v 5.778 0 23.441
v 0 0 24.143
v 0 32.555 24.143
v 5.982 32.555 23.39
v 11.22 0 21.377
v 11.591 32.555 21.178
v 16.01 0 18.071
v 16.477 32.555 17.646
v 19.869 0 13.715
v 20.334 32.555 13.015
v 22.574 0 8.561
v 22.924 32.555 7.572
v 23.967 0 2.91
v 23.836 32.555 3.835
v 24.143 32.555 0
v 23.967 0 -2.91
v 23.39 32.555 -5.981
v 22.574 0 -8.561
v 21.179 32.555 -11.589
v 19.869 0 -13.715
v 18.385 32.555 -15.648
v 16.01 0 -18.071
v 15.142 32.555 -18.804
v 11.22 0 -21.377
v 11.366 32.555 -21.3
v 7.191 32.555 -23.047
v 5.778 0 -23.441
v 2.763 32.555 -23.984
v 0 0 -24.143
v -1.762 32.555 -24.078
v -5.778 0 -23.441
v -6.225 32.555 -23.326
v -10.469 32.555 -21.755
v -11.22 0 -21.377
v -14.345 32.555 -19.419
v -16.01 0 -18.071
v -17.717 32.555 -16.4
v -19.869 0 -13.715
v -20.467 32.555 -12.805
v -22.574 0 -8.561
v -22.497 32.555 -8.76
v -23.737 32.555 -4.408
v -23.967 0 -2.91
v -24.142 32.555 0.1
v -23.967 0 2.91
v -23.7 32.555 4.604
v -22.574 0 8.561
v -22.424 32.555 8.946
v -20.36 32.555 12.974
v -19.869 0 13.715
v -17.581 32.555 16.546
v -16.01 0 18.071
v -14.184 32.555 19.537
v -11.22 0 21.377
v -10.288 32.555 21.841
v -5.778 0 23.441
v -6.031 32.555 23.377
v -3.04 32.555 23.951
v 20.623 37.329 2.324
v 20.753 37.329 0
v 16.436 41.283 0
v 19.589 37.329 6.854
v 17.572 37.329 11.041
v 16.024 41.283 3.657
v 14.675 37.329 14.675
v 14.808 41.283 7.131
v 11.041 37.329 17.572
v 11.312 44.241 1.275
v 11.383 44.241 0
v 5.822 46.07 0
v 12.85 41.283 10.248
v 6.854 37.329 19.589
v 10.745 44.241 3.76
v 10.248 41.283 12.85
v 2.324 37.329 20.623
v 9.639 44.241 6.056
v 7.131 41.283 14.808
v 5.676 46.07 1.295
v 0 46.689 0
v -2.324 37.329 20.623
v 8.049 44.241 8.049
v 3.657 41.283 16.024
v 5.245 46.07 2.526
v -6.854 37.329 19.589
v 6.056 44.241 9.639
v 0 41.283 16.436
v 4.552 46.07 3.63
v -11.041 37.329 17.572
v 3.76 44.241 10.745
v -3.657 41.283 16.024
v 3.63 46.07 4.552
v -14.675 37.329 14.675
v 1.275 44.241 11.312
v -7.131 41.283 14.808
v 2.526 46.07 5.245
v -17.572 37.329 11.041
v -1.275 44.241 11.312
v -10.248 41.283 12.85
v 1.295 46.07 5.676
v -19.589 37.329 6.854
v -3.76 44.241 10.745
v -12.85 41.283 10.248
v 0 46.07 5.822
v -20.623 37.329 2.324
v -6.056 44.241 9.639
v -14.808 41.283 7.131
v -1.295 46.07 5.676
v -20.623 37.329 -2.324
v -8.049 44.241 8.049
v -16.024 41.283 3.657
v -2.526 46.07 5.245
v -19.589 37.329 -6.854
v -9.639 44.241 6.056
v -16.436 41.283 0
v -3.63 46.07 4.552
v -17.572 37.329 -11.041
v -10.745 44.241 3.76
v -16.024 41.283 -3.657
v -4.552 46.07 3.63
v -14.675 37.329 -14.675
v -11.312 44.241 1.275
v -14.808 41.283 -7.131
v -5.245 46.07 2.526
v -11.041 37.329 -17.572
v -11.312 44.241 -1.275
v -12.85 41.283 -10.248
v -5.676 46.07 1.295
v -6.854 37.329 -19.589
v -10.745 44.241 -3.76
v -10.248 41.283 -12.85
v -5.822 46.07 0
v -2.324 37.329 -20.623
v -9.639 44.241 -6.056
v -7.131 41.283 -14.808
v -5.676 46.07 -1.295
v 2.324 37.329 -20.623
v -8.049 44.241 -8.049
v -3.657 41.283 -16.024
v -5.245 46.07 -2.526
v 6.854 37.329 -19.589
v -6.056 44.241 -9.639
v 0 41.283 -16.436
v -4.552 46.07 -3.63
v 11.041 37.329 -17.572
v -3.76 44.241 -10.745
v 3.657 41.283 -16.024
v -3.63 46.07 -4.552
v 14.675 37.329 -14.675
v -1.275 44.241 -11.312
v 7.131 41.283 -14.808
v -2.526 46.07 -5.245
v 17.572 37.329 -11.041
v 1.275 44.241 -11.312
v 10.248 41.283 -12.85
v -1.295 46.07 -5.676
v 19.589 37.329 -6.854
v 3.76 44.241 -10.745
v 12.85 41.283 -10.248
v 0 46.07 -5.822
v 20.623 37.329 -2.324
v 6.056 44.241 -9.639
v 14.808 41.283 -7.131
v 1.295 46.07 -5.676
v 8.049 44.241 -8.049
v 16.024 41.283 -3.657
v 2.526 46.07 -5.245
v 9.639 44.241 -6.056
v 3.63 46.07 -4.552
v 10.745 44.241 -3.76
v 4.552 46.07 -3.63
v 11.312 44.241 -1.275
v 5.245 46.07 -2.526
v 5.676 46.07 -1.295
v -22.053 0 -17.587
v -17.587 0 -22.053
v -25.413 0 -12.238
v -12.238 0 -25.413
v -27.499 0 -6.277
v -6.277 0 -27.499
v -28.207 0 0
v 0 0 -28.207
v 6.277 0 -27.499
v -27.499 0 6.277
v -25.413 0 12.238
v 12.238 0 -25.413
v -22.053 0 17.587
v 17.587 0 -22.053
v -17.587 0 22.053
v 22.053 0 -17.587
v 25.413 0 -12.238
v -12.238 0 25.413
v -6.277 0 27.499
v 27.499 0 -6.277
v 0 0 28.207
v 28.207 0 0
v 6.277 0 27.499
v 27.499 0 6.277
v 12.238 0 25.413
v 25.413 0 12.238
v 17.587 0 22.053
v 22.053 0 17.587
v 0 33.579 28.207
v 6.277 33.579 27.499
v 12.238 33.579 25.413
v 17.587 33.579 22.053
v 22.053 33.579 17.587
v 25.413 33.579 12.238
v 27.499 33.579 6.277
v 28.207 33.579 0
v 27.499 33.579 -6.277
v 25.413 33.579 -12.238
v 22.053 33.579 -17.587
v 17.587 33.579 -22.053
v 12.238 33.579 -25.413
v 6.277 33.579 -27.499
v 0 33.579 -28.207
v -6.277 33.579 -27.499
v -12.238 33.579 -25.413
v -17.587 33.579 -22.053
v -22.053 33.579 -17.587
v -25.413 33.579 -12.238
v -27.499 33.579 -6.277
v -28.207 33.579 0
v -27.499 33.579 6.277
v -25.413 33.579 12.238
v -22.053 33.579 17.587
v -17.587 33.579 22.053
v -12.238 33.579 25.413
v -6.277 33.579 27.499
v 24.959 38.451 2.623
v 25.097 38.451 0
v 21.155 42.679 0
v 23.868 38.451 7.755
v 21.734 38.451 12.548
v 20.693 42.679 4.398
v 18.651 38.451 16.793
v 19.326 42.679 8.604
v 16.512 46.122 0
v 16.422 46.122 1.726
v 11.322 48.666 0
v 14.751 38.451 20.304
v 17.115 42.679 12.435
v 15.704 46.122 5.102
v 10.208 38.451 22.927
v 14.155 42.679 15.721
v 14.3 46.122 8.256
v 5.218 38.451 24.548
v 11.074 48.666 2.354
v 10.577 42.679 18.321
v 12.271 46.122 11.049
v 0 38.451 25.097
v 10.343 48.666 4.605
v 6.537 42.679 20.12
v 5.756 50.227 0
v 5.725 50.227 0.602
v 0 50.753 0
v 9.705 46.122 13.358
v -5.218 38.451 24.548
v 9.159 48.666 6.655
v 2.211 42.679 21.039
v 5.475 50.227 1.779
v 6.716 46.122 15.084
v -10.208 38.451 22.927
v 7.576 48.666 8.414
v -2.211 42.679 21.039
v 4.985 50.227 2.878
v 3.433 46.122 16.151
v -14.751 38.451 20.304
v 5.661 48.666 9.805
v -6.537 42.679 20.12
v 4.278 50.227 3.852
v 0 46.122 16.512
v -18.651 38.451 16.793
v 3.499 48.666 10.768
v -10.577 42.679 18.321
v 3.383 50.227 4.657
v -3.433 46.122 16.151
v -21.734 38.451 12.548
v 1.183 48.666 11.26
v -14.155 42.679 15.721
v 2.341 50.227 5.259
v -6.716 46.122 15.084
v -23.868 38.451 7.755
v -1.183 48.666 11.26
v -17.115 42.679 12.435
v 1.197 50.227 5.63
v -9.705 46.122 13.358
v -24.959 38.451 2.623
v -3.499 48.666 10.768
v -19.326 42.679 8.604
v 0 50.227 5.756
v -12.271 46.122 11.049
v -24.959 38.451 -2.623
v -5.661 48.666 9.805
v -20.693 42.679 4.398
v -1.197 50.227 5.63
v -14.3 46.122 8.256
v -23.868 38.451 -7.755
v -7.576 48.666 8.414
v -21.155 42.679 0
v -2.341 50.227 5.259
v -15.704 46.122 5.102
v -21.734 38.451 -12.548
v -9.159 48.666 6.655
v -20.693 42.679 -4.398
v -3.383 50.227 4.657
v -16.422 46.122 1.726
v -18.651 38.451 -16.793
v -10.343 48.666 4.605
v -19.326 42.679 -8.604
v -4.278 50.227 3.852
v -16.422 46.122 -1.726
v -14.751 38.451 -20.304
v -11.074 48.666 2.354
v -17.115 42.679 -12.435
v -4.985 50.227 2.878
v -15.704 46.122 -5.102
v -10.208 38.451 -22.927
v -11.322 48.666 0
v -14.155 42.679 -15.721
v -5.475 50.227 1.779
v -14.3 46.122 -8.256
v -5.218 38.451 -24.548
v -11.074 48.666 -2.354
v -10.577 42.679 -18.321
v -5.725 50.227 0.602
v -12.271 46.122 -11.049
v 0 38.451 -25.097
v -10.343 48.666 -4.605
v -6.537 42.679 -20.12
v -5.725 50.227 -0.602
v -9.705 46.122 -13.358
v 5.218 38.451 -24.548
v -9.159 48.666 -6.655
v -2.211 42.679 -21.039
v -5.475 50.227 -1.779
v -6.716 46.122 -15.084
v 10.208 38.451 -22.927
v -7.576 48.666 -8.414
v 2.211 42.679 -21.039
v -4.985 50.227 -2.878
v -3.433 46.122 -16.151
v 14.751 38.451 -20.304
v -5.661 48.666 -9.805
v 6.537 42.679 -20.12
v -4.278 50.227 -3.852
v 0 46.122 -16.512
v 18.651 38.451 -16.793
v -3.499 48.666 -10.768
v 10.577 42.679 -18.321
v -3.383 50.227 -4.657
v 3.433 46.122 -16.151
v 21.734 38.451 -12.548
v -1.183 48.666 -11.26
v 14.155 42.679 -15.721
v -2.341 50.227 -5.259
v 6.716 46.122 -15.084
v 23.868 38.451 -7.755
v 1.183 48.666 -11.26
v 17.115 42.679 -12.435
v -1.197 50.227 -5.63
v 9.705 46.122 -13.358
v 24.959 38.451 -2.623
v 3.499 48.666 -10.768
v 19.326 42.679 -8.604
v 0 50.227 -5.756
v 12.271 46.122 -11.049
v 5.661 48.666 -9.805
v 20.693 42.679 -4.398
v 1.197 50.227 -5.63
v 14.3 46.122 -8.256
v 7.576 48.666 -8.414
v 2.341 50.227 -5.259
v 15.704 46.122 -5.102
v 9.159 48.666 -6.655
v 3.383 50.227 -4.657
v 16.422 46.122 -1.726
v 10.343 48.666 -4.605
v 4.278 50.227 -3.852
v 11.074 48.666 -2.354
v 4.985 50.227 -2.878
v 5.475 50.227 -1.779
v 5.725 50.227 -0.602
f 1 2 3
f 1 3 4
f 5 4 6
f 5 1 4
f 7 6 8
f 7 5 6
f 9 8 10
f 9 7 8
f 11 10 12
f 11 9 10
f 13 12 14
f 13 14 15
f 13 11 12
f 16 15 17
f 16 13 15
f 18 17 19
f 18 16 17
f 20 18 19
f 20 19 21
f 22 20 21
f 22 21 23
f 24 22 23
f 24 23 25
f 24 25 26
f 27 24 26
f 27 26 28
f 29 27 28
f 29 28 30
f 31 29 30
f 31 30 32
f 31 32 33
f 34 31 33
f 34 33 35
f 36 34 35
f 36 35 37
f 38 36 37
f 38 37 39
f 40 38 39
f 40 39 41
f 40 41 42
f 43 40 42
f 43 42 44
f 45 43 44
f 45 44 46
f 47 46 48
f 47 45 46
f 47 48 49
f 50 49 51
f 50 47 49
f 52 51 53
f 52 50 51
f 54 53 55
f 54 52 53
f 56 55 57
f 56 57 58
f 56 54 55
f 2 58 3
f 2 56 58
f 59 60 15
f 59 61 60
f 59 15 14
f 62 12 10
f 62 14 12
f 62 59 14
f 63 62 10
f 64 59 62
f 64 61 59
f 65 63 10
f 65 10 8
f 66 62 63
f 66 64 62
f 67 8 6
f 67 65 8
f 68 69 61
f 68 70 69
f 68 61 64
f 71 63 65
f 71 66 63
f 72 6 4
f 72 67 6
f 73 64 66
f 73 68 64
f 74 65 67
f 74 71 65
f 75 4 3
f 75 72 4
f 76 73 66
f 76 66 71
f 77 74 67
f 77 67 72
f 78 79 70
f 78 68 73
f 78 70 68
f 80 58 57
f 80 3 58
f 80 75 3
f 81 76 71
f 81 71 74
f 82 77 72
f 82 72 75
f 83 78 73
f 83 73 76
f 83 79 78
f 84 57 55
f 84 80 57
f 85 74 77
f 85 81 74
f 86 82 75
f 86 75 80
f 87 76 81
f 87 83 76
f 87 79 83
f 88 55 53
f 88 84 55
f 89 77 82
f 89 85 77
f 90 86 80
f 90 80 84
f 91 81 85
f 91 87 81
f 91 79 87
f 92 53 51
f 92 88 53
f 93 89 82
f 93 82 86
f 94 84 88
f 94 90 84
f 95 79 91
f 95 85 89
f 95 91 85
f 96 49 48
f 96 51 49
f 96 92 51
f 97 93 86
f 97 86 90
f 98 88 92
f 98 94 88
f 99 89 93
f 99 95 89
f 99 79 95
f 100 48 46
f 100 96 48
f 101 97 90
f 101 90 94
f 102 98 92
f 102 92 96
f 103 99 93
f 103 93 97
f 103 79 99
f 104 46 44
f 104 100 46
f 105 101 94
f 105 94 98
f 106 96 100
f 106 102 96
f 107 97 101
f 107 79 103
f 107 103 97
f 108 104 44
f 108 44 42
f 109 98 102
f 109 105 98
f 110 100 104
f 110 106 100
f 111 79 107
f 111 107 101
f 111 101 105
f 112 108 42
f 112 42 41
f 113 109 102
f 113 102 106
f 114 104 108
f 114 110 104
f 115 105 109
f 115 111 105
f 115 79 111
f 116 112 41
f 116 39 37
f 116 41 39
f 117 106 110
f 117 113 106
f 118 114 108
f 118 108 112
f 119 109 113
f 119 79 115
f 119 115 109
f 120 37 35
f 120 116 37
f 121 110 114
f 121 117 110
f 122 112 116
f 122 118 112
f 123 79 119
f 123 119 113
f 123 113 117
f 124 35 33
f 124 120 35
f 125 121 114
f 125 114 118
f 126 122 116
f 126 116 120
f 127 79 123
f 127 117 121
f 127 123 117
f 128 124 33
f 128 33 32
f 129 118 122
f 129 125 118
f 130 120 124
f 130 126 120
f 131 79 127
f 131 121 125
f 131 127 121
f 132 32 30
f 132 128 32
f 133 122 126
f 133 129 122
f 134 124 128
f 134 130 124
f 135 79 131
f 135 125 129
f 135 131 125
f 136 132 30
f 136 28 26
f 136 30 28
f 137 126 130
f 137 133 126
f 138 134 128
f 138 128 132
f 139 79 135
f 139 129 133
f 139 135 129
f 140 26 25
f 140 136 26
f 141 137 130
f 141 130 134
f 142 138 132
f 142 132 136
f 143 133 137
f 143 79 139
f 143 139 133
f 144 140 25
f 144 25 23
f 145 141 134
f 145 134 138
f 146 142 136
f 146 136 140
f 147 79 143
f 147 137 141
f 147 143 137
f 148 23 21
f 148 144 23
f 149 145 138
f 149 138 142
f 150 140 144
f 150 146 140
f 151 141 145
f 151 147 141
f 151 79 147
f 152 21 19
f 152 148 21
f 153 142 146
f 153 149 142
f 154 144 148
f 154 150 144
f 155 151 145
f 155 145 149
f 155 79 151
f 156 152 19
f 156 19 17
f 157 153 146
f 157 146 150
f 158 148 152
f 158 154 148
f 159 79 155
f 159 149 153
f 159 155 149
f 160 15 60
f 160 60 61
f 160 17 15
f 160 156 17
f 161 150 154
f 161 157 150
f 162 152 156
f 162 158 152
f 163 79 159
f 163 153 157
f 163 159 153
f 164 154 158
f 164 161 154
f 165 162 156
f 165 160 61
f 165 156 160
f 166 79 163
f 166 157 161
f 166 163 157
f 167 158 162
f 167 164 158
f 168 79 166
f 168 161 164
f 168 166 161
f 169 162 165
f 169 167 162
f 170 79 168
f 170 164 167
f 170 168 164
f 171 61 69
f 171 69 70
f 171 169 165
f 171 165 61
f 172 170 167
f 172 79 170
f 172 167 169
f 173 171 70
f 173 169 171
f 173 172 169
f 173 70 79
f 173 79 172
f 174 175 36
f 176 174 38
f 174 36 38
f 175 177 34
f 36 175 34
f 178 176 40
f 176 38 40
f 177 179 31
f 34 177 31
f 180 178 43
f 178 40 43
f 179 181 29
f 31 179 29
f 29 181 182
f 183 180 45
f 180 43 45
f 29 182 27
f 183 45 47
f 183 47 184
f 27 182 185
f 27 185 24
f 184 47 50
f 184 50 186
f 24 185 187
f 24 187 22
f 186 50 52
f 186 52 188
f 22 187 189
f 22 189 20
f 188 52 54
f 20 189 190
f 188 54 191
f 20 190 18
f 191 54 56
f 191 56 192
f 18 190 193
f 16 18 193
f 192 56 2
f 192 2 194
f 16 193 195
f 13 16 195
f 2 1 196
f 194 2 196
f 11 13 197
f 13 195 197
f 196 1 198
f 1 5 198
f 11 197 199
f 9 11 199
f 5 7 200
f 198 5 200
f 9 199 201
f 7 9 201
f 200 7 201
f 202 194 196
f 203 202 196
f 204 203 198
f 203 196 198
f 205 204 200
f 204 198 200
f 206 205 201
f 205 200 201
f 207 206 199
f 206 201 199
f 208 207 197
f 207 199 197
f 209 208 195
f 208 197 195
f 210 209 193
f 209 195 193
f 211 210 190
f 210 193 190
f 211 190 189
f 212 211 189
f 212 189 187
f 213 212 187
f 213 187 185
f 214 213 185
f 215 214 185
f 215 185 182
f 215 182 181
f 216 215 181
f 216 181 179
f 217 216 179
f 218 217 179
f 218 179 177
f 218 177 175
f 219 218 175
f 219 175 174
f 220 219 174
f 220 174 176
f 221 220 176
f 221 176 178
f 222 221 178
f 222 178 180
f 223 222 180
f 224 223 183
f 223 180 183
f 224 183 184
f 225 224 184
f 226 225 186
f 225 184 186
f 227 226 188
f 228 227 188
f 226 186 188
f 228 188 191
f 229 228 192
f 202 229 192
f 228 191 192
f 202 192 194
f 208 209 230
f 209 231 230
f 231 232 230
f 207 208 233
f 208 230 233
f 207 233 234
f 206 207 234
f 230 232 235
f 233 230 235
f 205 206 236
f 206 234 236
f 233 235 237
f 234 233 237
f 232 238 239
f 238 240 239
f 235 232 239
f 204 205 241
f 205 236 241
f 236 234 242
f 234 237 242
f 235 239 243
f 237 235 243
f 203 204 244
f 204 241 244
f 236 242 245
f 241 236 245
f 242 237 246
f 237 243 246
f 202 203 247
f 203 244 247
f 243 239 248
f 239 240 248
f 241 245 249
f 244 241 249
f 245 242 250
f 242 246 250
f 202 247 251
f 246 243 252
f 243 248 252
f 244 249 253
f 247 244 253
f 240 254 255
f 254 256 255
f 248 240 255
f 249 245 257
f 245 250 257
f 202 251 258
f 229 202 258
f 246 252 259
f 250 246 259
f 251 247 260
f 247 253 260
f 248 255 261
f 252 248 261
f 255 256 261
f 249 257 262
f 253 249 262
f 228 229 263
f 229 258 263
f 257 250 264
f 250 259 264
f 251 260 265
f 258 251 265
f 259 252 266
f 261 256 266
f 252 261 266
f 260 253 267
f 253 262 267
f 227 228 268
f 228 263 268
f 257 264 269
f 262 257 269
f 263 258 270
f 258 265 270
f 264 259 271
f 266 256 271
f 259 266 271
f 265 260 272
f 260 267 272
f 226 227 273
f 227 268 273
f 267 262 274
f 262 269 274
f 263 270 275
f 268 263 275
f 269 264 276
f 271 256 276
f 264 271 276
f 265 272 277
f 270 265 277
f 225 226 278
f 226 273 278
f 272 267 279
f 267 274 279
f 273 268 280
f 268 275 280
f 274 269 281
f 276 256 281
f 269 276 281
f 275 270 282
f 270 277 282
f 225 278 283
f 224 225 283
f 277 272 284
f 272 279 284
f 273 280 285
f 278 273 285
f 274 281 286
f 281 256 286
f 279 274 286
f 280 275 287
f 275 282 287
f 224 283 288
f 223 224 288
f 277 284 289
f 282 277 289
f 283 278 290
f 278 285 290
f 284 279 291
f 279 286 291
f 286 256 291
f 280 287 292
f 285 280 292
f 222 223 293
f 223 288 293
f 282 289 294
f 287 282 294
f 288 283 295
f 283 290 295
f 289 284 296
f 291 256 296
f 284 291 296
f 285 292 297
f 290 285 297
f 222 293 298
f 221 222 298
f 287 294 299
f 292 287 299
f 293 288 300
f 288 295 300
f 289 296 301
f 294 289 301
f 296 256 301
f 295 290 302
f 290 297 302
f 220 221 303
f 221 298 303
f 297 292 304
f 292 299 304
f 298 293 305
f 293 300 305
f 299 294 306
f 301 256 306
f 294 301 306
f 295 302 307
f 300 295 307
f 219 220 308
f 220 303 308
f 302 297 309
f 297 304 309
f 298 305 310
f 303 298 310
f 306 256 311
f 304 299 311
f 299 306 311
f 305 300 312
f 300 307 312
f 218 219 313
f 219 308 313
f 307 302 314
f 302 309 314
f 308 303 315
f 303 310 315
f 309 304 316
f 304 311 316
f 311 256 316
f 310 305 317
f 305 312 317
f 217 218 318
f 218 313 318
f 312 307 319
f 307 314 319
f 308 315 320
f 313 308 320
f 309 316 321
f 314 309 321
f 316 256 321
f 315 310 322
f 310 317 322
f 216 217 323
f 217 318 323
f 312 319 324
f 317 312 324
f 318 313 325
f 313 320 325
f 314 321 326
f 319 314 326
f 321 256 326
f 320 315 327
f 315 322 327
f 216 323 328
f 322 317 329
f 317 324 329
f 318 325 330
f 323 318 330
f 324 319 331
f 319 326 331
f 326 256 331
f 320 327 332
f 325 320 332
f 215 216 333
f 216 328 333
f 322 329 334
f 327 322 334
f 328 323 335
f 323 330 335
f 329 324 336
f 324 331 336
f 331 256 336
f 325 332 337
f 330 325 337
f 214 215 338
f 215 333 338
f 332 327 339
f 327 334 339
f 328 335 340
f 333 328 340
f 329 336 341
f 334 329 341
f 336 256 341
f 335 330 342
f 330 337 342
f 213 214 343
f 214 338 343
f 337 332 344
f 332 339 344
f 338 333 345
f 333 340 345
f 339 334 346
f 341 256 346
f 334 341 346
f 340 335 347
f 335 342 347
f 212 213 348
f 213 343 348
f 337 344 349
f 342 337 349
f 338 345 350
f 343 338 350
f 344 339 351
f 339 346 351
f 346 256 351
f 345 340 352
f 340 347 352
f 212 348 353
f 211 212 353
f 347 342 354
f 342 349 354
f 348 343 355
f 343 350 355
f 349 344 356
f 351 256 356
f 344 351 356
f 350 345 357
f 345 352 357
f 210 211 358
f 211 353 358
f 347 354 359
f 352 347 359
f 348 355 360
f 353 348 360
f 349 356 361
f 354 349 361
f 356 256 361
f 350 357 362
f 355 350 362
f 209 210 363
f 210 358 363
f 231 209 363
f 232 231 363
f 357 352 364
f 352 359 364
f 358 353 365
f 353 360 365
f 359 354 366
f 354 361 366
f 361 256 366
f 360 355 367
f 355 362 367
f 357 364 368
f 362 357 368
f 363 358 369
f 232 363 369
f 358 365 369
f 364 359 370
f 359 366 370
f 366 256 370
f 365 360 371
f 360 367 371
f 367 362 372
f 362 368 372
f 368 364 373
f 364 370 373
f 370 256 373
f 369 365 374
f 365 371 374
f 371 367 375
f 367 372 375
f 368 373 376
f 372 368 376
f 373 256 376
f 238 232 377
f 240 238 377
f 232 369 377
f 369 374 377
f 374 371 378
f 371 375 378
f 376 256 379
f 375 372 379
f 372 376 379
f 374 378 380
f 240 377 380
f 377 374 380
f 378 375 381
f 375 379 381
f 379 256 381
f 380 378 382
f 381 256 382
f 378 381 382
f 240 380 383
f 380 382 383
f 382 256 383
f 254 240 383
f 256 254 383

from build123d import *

# Parameters (mm, degrees)
SKETCH1_R           = 28.2067
BOSS_EXTRUDE1_DEPTH = 33.5788
SHELL1_T            = -4.064


with BuildPart() as part:
    # Sketch1 → Boss-Extrude1 (new body)
    with BuildSketch(Plane(origin=(0, 0, 0), x_dir=(1, 0, 0), z_dir=(0, 1, 0))):
        with Locations(Location((0, 0, 0), (0, 0, 270))):
            Circle(SKETCH1_R)
    extrude(amount=BOSS_EXTRUDE1_DEPTH)

    # Sketch2 → Revolve1 (revolve)
    with BuildSketch(Plane.XY, mode=Mode.PRIVATE) as revolve1_sk:
        with BuildLine():
            Line((0, 33.5788), (-28.2067, 33.5788))
            ThreePointArc((-28.2067, 33.5788), (-16.511981345, 46.121893901), (0, 50.753321445))
            Line((0, 50.753321445), (0, 33.5788))
        make_face()
    revolve(revolve1_sk.sketch.rotate(Axis((0, 50.753321445, 0), (0, -1, 0)), 180), axis=Axis((0, 50.753321445, 0), (0, -1, 0)))

    # Shell1
    shell1_openings = [part.faces().sort_by_distance(p)[0] for p in [
        (0, 0, 0),
    ]]
    offset(amount=SHELL1_T, openings=shell1_openings)


solid = part.part
